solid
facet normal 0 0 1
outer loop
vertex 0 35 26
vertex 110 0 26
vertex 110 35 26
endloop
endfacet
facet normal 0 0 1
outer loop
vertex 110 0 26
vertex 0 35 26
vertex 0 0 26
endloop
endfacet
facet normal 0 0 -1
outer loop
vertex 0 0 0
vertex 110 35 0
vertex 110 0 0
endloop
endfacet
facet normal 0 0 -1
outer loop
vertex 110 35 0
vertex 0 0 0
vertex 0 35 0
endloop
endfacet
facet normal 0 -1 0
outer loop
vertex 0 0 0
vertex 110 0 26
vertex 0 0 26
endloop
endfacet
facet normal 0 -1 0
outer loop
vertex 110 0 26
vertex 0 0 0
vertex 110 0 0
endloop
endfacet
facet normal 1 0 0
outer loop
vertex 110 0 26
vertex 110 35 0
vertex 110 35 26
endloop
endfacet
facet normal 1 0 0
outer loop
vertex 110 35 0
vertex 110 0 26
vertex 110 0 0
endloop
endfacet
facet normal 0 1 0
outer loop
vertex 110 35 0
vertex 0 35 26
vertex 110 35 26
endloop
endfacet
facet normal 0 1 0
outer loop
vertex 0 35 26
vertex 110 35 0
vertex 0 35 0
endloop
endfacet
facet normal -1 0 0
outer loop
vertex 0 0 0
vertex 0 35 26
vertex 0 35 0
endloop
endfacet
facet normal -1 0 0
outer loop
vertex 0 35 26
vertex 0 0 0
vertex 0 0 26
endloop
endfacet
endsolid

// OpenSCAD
// =====================================================================
// lipo_35x26x110.scad — 子機用 LiPo (製品名・容量 要確認, 2026-09-03 ユーザー指定)
//
// 購入品だがベンダの 3D データが無いため、指定寸法から自作した確認用モデル。
// 印刷対象ではない (アセンブリの干渉確認とベイ寸法決定に使う)。
//
// 出典: ユーザー指定 2026-09-03。外形 110(長さ) x 35(幅) x 26(厚み) mm。
//       製品名・容量・質量は要確認。
//
// 原点: 左手前下の角 (0,0,0)。X=長さ110 (cell_l) / Y=幅35 (cell_w) / Z=厚み26 (cell_h)。
//       リードは両方とも +X 端面から出る (35mm 辺の両端寄り、Z 中央)。
//
// バリアント (variants.txt):
//   pack  … セル本体のみ。ベイ内寸を決めるのはこちら
//   leads … 本体 + リードスタブ (充電用 / 電源用) の干渉確認用
//
// Fusion編集用に cube のみ (角丸は付けない — CLAUDE.md 規約)。
// =====================================================================

/* [セル本体 (指定値)] */
cell_l    = 110;   // 長さ (X)
cell_w    = 35;    // 幅   (Y)
cell_h    = 26;    // 厚み (Z)
tol       = 0;     // 製造ばらつき。ベイ側で吸収するのでモデルは 0 のまま使う

/* [リードスタブ (簡易表現)]  実際のリード形状は要確認。ここでは占有ゾーンとして cube スタブで表現 */
show_leads   = false;  // true でリードスタブを付ける (leads バリアント)
lead_edge    = 4.5;    // 35mm 辺の端からリード中心までの距離
lead_d       = 4;      // スタブの一辺 (角断面で近似)
lead_stub_l  = 8;      // +X 方向への突き出し長さ

$fn = 32;

// ---- 導出 -----------------------------------------------------------
bl = cell_l + tol;
bw = cell_w + tol;
bh = cell_h + tol;

// 充電用リード中心 (Y)
lead_chg_y = lead_edge;
// 電源用リード中心 (Y)
lead_pwr_y = bw - lead_edge;
// リード共通 Z 中心
lead_z = bh / 2;

// ---- 成立性チェック --------------------------------------------------
// リードスタブがセル幅の内側に収まっていること (端面からはみ出すと宙に浮く)
assert(lead_edge + lead_d / 2 < bw / 2,
       str("リードスタブ (edge=", lead_edge, " d=", lead_d,
           ") がセル幅 ", bw, " の中心線を超過"));
// パックとして辻褄が合う体積か (概ね 60cm^3 以上)
assert(bl * bw * bh > 60000,
       "セル外形が子機用 LiPo として小さすぎる — 寸法の取り違えを疑うこと");

// ---- 本体 -------------------------------------------------------------
union() {
    // セル本体 (熱収縮チューブ外形)
    cube([bl, bw, bh]);

    // リードスタブ (充電用 / 電源用、いずれも +X 端面から突き出す)
    if (show_leads) {
        translate([bl, lead_chg_y - lead_d / 2, lead_z - lead_d / 2])
            cube([lead_stub_l, lead_d, lead_d]);
        translate([bl, lead_pwr_y - lead_d / 2, lead_z - lead_d / 2])
            cube([lead_stub_l, lead_d, lead_d]);
    }
}

echo(str("lipo_35x26x110: ", bl, " x ", bw, " x ", bh,
         show_leads ? str("  +リードスタブ ", lead_stub_l) : "",
         "  全長 ", bl + (show_leads ? lead_stub_l : 0)));
